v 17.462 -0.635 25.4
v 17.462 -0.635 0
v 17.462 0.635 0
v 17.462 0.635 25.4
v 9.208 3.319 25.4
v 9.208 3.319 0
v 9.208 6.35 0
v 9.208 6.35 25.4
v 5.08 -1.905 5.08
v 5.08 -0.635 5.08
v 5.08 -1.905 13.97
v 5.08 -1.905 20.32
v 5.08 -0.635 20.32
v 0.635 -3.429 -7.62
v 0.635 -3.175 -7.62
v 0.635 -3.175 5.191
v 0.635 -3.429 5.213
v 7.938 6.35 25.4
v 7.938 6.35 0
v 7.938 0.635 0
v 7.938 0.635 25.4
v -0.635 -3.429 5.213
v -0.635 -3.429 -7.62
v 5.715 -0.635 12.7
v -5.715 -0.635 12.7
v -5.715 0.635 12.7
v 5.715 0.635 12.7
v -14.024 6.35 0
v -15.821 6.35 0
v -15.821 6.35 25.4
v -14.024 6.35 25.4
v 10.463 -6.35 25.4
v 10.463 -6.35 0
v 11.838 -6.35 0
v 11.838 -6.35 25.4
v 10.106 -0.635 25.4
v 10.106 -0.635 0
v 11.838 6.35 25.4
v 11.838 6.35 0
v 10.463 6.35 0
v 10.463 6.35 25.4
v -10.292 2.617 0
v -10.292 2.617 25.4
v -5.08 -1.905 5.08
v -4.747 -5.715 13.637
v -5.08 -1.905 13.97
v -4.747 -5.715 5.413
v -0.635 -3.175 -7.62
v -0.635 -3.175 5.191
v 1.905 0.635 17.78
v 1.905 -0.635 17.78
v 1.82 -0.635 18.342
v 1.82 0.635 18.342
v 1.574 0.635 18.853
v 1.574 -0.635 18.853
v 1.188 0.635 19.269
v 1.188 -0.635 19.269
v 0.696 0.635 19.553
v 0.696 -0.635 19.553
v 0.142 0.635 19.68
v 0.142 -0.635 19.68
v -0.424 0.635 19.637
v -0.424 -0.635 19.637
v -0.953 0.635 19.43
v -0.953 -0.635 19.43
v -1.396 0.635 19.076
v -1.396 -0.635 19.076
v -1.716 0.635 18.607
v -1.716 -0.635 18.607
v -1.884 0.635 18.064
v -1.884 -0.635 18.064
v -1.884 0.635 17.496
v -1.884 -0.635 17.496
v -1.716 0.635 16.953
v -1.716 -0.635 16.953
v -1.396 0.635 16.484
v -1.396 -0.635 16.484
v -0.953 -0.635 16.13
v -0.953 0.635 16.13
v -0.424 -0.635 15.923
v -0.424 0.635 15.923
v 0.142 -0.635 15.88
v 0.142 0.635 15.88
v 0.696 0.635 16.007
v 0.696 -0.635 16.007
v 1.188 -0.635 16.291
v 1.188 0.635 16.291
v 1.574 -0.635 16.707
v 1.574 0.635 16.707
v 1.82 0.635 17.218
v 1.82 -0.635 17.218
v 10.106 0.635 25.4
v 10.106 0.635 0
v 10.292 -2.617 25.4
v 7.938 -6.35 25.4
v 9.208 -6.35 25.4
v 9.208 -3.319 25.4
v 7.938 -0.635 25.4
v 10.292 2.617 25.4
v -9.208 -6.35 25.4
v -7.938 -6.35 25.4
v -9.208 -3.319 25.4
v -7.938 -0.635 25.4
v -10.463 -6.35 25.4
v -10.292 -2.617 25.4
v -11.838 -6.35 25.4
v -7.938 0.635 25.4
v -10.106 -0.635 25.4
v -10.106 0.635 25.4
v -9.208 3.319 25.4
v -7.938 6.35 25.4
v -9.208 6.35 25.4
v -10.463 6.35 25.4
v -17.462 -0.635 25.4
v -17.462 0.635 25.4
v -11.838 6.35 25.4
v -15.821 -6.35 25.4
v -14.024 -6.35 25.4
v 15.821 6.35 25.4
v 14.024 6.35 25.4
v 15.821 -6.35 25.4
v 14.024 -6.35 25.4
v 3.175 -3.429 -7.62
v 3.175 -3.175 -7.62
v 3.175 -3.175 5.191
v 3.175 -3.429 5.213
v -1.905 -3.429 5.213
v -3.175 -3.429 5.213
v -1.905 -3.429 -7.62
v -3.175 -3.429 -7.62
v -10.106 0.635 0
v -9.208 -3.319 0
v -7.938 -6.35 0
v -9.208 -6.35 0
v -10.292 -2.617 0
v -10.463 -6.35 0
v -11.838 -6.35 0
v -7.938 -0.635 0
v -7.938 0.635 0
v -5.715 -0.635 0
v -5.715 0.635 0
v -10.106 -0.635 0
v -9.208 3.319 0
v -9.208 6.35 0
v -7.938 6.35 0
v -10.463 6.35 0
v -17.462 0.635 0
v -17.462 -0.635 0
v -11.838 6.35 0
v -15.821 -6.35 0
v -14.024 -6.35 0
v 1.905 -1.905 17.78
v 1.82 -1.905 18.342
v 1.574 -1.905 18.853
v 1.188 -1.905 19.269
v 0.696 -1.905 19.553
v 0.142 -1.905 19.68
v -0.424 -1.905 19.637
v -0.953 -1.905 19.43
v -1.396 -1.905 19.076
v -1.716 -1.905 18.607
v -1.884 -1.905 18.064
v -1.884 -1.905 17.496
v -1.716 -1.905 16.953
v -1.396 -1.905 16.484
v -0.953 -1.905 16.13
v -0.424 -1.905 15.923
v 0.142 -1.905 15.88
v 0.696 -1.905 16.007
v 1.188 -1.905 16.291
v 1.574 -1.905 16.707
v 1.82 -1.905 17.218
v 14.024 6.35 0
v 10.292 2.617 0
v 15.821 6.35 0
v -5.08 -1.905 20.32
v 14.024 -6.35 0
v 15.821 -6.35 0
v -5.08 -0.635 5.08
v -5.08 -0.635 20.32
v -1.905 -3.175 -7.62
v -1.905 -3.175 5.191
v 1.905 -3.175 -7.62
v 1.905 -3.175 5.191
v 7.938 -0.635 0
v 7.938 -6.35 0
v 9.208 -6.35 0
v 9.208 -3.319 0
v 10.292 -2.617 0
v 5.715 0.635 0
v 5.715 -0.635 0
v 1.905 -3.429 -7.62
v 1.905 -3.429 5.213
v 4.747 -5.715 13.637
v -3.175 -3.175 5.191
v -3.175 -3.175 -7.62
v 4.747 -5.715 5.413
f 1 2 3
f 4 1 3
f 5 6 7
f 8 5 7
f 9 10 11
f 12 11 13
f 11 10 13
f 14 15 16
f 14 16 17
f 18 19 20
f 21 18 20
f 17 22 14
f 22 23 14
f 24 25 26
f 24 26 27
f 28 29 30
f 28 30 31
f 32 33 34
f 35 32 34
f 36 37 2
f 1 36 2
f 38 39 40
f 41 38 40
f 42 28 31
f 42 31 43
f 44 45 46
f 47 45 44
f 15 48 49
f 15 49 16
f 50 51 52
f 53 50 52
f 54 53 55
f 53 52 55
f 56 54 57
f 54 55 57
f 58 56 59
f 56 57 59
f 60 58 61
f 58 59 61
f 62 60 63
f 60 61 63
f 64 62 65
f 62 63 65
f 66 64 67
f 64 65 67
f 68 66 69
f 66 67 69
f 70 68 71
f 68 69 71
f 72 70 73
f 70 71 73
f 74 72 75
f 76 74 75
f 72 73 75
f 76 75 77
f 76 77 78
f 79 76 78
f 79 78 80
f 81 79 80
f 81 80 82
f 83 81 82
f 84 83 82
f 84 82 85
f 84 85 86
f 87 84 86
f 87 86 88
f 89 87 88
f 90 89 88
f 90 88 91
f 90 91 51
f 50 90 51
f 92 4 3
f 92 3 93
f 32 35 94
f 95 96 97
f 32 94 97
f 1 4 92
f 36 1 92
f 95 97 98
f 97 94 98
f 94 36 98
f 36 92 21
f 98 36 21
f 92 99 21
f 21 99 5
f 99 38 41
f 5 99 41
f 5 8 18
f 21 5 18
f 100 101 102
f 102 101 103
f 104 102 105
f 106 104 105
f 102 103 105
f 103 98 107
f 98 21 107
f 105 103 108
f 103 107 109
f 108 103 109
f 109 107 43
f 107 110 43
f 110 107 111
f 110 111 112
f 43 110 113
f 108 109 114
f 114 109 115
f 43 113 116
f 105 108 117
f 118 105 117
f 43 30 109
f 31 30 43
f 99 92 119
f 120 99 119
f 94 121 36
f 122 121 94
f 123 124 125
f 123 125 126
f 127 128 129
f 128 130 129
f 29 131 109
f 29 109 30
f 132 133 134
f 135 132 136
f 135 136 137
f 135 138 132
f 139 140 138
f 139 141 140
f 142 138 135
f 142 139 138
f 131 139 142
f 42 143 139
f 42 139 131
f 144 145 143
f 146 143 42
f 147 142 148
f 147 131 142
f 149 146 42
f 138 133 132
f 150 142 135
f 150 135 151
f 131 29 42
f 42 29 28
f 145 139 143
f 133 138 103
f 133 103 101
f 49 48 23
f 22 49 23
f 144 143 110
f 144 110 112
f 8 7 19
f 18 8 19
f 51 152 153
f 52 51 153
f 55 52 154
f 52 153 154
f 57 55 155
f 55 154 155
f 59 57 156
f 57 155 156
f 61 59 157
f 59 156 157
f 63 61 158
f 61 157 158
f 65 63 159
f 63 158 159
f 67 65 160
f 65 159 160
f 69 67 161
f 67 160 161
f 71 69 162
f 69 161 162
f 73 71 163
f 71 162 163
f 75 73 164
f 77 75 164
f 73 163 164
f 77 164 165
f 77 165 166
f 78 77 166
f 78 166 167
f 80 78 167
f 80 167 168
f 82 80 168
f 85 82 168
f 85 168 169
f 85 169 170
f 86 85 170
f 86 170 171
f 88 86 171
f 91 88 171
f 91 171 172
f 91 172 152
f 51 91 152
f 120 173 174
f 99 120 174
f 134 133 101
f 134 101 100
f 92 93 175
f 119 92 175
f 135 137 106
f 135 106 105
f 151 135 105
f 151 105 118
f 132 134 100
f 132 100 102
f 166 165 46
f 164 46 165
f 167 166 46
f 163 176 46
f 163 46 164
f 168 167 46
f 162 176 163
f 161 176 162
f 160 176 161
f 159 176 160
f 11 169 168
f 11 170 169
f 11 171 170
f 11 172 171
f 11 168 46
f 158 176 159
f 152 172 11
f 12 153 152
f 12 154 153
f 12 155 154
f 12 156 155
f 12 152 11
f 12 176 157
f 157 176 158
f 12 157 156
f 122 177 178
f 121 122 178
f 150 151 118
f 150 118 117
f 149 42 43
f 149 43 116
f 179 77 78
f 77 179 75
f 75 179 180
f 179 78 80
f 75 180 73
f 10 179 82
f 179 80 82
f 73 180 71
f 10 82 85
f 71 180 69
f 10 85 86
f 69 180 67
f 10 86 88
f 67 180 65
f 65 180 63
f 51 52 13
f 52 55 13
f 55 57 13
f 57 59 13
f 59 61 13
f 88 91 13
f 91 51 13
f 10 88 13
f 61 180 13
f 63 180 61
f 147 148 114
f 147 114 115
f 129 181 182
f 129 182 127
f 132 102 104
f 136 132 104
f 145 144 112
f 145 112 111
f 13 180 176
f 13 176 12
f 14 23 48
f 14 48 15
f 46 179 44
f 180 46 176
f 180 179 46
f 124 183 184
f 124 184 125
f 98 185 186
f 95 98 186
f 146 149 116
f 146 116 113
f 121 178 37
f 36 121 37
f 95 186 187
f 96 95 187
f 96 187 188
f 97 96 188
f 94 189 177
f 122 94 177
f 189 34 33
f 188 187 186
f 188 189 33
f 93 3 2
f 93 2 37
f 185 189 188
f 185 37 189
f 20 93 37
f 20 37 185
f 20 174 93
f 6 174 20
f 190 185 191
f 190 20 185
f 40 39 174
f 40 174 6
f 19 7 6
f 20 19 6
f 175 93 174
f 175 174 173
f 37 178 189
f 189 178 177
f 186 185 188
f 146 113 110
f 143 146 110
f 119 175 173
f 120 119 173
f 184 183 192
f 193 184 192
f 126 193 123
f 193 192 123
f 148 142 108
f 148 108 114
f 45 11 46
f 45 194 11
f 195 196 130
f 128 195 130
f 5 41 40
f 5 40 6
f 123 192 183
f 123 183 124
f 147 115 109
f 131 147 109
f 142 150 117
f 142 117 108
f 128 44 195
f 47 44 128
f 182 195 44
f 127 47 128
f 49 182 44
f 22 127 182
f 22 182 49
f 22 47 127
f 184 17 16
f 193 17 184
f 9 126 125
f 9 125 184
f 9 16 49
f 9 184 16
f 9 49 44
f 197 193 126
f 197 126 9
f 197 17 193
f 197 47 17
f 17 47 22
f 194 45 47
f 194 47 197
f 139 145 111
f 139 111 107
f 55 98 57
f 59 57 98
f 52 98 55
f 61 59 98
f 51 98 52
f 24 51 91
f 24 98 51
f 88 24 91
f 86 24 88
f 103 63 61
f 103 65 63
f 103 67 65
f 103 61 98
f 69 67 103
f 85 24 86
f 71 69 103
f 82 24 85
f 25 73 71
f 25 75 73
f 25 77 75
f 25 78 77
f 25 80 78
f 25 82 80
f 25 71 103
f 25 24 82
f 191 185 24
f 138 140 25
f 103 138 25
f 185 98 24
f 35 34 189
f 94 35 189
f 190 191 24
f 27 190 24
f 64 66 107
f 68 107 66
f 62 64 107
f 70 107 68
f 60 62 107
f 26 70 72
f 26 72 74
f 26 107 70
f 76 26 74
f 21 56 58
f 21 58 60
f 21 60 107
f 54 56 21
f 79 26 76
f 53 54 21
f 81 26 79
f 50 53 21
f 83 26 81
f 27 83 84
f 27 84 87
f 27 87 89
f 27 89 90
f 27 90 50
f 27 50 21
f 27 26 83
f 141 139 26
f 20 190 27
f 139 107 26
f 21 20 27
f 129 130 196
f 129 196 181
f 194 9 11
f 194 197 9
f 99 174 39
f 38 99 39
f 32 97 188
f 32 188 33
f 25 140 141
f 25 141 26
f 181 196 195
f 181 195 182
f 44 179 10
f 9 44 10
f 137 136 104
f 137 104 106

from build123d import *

# Parameters (mm, degrees)
F1_DEPTH       = 25.4
F3_W           = 11.43
F3_H           = 12.7
F4_DEPTH       = 6.986
F5_W           = 10.16
F5_H           = 15.24
F6_DEPTH       = 1.27
F7_W           = 10.16
F7_H           = 8.89
F8_DEPTH       = 3.81
F8_TAPER       = 5
F10_R          = 1.905
F11_DEPTH      = 8.256
F12_W          = 1.27
F12_H          = 0.254
F13_DEPTH      = 12.7
F13_DEPTH_BACK = 0.1333328232


with BuildPart() as f1:
    # F0 (on Top) → F1 (new body)
    with BuildSketch(Plane.XY):
        Polygon((7.9375, -0.635), (7.9375, -6.35), (9.2075, -6.35), (9.2075, -3.3186699308), (10.4631180267, -6.35), (11.8377561211, -6.35), (10.2915128061, -2.6170384182), (14.0244743879, -6.35), (15.8205256121, -6.35), (10.1055256121, -0.635), (17.4625, -0.635), (17.4625, 0.635), (10.1055256121, 0.635), (15.8205256121, 6.35), (14.0244743879, 6.35), (10.2915128061, 2.6170384182), (11.8377561211, 6.35), (10.4631180267, 6.35), (9.2075, 3.3186699308), (9.2075, 6.35), (7.9375, 6.35), (7.9375, 0.635), (0, 0.635), (0, -0.635), align=None)
    extrude(amount=F1_DEPTH)

    # F2: F1 across plane


with BuildPart() as f1_1:
    add(f1.part)
    add(f1.part.mirror(Plane.YZ))

    # F3 (on face) → F4 (cut, through all)
    with BuildSketch(Plane.XZ.offset(0.635)):
        with Locations((0, 6.35)):
            Rectangle(F3_W, F3_H)
    extrude(amount=-F4_DEPTH, mode=Mode.SUBTRACT)


with BuildPart() as f6:
    # F5 (on face) → F6 (new body)
    with BuildSketch(Plane.XZ.offset(0.635)):
        with Locations((0, 12.7)):
            Rectangle(F5_W, F5_H)
    extrude(amount=F6_DEPTH)

    # F7 (on face) → F8 (join)
    with BuildSketch(Plane.XZ.offset(1.905)):
        with Locations((0, 9.525)):
            Rectangle(F7_W, F7_H)
    extrude(amount=F8_DEPTH, taper=F8_TAPER)


with BuildPart() as f11_tool:
    # F10 (on face) → F11 (new body, through all)
    with BuildSketch(Plane.XZ.offset(1.905)):
        with Locations((0, 17.78)):
            Circle(F10_R)
    extrude(amount=-F11_DEPTH)


with BuildPart() as f1_2:
    add(f1_1.part)

    # F11: cut by f11_tool
    add(f11_tool.part, mode=Mode.SUBTRACT)


with BuildPart() as f6_1:
    add(f6.part)

    # F11: cut by f11_tool
    add(f11_tool.part, mode=Mode.SUBTRACT)

    # F12 (on face) → F13 (join, two sides)
    with BuildSketch(Plane(origin=(0, 0, 5.08), x_dir=(1, 0, 0), z_dir=(0, 0, -1))) as f13_sk:
        with Locations((0, 3.302)):
            Rectangle(F12_W, F12_H)
        with Locations((-2.54, 3.302)):
            Rectangle(F12_W, F12_H)
        with Locations((2.54, 3.302)):
            Rectangle(F12_W, F12_H)
    extrude(amount=F13_DEPTH)
    extrude(f13_sk.sketch, amount=-F13_DEPTH_BACK)


solid = Compound([f1_2.part, f6_1.part])
